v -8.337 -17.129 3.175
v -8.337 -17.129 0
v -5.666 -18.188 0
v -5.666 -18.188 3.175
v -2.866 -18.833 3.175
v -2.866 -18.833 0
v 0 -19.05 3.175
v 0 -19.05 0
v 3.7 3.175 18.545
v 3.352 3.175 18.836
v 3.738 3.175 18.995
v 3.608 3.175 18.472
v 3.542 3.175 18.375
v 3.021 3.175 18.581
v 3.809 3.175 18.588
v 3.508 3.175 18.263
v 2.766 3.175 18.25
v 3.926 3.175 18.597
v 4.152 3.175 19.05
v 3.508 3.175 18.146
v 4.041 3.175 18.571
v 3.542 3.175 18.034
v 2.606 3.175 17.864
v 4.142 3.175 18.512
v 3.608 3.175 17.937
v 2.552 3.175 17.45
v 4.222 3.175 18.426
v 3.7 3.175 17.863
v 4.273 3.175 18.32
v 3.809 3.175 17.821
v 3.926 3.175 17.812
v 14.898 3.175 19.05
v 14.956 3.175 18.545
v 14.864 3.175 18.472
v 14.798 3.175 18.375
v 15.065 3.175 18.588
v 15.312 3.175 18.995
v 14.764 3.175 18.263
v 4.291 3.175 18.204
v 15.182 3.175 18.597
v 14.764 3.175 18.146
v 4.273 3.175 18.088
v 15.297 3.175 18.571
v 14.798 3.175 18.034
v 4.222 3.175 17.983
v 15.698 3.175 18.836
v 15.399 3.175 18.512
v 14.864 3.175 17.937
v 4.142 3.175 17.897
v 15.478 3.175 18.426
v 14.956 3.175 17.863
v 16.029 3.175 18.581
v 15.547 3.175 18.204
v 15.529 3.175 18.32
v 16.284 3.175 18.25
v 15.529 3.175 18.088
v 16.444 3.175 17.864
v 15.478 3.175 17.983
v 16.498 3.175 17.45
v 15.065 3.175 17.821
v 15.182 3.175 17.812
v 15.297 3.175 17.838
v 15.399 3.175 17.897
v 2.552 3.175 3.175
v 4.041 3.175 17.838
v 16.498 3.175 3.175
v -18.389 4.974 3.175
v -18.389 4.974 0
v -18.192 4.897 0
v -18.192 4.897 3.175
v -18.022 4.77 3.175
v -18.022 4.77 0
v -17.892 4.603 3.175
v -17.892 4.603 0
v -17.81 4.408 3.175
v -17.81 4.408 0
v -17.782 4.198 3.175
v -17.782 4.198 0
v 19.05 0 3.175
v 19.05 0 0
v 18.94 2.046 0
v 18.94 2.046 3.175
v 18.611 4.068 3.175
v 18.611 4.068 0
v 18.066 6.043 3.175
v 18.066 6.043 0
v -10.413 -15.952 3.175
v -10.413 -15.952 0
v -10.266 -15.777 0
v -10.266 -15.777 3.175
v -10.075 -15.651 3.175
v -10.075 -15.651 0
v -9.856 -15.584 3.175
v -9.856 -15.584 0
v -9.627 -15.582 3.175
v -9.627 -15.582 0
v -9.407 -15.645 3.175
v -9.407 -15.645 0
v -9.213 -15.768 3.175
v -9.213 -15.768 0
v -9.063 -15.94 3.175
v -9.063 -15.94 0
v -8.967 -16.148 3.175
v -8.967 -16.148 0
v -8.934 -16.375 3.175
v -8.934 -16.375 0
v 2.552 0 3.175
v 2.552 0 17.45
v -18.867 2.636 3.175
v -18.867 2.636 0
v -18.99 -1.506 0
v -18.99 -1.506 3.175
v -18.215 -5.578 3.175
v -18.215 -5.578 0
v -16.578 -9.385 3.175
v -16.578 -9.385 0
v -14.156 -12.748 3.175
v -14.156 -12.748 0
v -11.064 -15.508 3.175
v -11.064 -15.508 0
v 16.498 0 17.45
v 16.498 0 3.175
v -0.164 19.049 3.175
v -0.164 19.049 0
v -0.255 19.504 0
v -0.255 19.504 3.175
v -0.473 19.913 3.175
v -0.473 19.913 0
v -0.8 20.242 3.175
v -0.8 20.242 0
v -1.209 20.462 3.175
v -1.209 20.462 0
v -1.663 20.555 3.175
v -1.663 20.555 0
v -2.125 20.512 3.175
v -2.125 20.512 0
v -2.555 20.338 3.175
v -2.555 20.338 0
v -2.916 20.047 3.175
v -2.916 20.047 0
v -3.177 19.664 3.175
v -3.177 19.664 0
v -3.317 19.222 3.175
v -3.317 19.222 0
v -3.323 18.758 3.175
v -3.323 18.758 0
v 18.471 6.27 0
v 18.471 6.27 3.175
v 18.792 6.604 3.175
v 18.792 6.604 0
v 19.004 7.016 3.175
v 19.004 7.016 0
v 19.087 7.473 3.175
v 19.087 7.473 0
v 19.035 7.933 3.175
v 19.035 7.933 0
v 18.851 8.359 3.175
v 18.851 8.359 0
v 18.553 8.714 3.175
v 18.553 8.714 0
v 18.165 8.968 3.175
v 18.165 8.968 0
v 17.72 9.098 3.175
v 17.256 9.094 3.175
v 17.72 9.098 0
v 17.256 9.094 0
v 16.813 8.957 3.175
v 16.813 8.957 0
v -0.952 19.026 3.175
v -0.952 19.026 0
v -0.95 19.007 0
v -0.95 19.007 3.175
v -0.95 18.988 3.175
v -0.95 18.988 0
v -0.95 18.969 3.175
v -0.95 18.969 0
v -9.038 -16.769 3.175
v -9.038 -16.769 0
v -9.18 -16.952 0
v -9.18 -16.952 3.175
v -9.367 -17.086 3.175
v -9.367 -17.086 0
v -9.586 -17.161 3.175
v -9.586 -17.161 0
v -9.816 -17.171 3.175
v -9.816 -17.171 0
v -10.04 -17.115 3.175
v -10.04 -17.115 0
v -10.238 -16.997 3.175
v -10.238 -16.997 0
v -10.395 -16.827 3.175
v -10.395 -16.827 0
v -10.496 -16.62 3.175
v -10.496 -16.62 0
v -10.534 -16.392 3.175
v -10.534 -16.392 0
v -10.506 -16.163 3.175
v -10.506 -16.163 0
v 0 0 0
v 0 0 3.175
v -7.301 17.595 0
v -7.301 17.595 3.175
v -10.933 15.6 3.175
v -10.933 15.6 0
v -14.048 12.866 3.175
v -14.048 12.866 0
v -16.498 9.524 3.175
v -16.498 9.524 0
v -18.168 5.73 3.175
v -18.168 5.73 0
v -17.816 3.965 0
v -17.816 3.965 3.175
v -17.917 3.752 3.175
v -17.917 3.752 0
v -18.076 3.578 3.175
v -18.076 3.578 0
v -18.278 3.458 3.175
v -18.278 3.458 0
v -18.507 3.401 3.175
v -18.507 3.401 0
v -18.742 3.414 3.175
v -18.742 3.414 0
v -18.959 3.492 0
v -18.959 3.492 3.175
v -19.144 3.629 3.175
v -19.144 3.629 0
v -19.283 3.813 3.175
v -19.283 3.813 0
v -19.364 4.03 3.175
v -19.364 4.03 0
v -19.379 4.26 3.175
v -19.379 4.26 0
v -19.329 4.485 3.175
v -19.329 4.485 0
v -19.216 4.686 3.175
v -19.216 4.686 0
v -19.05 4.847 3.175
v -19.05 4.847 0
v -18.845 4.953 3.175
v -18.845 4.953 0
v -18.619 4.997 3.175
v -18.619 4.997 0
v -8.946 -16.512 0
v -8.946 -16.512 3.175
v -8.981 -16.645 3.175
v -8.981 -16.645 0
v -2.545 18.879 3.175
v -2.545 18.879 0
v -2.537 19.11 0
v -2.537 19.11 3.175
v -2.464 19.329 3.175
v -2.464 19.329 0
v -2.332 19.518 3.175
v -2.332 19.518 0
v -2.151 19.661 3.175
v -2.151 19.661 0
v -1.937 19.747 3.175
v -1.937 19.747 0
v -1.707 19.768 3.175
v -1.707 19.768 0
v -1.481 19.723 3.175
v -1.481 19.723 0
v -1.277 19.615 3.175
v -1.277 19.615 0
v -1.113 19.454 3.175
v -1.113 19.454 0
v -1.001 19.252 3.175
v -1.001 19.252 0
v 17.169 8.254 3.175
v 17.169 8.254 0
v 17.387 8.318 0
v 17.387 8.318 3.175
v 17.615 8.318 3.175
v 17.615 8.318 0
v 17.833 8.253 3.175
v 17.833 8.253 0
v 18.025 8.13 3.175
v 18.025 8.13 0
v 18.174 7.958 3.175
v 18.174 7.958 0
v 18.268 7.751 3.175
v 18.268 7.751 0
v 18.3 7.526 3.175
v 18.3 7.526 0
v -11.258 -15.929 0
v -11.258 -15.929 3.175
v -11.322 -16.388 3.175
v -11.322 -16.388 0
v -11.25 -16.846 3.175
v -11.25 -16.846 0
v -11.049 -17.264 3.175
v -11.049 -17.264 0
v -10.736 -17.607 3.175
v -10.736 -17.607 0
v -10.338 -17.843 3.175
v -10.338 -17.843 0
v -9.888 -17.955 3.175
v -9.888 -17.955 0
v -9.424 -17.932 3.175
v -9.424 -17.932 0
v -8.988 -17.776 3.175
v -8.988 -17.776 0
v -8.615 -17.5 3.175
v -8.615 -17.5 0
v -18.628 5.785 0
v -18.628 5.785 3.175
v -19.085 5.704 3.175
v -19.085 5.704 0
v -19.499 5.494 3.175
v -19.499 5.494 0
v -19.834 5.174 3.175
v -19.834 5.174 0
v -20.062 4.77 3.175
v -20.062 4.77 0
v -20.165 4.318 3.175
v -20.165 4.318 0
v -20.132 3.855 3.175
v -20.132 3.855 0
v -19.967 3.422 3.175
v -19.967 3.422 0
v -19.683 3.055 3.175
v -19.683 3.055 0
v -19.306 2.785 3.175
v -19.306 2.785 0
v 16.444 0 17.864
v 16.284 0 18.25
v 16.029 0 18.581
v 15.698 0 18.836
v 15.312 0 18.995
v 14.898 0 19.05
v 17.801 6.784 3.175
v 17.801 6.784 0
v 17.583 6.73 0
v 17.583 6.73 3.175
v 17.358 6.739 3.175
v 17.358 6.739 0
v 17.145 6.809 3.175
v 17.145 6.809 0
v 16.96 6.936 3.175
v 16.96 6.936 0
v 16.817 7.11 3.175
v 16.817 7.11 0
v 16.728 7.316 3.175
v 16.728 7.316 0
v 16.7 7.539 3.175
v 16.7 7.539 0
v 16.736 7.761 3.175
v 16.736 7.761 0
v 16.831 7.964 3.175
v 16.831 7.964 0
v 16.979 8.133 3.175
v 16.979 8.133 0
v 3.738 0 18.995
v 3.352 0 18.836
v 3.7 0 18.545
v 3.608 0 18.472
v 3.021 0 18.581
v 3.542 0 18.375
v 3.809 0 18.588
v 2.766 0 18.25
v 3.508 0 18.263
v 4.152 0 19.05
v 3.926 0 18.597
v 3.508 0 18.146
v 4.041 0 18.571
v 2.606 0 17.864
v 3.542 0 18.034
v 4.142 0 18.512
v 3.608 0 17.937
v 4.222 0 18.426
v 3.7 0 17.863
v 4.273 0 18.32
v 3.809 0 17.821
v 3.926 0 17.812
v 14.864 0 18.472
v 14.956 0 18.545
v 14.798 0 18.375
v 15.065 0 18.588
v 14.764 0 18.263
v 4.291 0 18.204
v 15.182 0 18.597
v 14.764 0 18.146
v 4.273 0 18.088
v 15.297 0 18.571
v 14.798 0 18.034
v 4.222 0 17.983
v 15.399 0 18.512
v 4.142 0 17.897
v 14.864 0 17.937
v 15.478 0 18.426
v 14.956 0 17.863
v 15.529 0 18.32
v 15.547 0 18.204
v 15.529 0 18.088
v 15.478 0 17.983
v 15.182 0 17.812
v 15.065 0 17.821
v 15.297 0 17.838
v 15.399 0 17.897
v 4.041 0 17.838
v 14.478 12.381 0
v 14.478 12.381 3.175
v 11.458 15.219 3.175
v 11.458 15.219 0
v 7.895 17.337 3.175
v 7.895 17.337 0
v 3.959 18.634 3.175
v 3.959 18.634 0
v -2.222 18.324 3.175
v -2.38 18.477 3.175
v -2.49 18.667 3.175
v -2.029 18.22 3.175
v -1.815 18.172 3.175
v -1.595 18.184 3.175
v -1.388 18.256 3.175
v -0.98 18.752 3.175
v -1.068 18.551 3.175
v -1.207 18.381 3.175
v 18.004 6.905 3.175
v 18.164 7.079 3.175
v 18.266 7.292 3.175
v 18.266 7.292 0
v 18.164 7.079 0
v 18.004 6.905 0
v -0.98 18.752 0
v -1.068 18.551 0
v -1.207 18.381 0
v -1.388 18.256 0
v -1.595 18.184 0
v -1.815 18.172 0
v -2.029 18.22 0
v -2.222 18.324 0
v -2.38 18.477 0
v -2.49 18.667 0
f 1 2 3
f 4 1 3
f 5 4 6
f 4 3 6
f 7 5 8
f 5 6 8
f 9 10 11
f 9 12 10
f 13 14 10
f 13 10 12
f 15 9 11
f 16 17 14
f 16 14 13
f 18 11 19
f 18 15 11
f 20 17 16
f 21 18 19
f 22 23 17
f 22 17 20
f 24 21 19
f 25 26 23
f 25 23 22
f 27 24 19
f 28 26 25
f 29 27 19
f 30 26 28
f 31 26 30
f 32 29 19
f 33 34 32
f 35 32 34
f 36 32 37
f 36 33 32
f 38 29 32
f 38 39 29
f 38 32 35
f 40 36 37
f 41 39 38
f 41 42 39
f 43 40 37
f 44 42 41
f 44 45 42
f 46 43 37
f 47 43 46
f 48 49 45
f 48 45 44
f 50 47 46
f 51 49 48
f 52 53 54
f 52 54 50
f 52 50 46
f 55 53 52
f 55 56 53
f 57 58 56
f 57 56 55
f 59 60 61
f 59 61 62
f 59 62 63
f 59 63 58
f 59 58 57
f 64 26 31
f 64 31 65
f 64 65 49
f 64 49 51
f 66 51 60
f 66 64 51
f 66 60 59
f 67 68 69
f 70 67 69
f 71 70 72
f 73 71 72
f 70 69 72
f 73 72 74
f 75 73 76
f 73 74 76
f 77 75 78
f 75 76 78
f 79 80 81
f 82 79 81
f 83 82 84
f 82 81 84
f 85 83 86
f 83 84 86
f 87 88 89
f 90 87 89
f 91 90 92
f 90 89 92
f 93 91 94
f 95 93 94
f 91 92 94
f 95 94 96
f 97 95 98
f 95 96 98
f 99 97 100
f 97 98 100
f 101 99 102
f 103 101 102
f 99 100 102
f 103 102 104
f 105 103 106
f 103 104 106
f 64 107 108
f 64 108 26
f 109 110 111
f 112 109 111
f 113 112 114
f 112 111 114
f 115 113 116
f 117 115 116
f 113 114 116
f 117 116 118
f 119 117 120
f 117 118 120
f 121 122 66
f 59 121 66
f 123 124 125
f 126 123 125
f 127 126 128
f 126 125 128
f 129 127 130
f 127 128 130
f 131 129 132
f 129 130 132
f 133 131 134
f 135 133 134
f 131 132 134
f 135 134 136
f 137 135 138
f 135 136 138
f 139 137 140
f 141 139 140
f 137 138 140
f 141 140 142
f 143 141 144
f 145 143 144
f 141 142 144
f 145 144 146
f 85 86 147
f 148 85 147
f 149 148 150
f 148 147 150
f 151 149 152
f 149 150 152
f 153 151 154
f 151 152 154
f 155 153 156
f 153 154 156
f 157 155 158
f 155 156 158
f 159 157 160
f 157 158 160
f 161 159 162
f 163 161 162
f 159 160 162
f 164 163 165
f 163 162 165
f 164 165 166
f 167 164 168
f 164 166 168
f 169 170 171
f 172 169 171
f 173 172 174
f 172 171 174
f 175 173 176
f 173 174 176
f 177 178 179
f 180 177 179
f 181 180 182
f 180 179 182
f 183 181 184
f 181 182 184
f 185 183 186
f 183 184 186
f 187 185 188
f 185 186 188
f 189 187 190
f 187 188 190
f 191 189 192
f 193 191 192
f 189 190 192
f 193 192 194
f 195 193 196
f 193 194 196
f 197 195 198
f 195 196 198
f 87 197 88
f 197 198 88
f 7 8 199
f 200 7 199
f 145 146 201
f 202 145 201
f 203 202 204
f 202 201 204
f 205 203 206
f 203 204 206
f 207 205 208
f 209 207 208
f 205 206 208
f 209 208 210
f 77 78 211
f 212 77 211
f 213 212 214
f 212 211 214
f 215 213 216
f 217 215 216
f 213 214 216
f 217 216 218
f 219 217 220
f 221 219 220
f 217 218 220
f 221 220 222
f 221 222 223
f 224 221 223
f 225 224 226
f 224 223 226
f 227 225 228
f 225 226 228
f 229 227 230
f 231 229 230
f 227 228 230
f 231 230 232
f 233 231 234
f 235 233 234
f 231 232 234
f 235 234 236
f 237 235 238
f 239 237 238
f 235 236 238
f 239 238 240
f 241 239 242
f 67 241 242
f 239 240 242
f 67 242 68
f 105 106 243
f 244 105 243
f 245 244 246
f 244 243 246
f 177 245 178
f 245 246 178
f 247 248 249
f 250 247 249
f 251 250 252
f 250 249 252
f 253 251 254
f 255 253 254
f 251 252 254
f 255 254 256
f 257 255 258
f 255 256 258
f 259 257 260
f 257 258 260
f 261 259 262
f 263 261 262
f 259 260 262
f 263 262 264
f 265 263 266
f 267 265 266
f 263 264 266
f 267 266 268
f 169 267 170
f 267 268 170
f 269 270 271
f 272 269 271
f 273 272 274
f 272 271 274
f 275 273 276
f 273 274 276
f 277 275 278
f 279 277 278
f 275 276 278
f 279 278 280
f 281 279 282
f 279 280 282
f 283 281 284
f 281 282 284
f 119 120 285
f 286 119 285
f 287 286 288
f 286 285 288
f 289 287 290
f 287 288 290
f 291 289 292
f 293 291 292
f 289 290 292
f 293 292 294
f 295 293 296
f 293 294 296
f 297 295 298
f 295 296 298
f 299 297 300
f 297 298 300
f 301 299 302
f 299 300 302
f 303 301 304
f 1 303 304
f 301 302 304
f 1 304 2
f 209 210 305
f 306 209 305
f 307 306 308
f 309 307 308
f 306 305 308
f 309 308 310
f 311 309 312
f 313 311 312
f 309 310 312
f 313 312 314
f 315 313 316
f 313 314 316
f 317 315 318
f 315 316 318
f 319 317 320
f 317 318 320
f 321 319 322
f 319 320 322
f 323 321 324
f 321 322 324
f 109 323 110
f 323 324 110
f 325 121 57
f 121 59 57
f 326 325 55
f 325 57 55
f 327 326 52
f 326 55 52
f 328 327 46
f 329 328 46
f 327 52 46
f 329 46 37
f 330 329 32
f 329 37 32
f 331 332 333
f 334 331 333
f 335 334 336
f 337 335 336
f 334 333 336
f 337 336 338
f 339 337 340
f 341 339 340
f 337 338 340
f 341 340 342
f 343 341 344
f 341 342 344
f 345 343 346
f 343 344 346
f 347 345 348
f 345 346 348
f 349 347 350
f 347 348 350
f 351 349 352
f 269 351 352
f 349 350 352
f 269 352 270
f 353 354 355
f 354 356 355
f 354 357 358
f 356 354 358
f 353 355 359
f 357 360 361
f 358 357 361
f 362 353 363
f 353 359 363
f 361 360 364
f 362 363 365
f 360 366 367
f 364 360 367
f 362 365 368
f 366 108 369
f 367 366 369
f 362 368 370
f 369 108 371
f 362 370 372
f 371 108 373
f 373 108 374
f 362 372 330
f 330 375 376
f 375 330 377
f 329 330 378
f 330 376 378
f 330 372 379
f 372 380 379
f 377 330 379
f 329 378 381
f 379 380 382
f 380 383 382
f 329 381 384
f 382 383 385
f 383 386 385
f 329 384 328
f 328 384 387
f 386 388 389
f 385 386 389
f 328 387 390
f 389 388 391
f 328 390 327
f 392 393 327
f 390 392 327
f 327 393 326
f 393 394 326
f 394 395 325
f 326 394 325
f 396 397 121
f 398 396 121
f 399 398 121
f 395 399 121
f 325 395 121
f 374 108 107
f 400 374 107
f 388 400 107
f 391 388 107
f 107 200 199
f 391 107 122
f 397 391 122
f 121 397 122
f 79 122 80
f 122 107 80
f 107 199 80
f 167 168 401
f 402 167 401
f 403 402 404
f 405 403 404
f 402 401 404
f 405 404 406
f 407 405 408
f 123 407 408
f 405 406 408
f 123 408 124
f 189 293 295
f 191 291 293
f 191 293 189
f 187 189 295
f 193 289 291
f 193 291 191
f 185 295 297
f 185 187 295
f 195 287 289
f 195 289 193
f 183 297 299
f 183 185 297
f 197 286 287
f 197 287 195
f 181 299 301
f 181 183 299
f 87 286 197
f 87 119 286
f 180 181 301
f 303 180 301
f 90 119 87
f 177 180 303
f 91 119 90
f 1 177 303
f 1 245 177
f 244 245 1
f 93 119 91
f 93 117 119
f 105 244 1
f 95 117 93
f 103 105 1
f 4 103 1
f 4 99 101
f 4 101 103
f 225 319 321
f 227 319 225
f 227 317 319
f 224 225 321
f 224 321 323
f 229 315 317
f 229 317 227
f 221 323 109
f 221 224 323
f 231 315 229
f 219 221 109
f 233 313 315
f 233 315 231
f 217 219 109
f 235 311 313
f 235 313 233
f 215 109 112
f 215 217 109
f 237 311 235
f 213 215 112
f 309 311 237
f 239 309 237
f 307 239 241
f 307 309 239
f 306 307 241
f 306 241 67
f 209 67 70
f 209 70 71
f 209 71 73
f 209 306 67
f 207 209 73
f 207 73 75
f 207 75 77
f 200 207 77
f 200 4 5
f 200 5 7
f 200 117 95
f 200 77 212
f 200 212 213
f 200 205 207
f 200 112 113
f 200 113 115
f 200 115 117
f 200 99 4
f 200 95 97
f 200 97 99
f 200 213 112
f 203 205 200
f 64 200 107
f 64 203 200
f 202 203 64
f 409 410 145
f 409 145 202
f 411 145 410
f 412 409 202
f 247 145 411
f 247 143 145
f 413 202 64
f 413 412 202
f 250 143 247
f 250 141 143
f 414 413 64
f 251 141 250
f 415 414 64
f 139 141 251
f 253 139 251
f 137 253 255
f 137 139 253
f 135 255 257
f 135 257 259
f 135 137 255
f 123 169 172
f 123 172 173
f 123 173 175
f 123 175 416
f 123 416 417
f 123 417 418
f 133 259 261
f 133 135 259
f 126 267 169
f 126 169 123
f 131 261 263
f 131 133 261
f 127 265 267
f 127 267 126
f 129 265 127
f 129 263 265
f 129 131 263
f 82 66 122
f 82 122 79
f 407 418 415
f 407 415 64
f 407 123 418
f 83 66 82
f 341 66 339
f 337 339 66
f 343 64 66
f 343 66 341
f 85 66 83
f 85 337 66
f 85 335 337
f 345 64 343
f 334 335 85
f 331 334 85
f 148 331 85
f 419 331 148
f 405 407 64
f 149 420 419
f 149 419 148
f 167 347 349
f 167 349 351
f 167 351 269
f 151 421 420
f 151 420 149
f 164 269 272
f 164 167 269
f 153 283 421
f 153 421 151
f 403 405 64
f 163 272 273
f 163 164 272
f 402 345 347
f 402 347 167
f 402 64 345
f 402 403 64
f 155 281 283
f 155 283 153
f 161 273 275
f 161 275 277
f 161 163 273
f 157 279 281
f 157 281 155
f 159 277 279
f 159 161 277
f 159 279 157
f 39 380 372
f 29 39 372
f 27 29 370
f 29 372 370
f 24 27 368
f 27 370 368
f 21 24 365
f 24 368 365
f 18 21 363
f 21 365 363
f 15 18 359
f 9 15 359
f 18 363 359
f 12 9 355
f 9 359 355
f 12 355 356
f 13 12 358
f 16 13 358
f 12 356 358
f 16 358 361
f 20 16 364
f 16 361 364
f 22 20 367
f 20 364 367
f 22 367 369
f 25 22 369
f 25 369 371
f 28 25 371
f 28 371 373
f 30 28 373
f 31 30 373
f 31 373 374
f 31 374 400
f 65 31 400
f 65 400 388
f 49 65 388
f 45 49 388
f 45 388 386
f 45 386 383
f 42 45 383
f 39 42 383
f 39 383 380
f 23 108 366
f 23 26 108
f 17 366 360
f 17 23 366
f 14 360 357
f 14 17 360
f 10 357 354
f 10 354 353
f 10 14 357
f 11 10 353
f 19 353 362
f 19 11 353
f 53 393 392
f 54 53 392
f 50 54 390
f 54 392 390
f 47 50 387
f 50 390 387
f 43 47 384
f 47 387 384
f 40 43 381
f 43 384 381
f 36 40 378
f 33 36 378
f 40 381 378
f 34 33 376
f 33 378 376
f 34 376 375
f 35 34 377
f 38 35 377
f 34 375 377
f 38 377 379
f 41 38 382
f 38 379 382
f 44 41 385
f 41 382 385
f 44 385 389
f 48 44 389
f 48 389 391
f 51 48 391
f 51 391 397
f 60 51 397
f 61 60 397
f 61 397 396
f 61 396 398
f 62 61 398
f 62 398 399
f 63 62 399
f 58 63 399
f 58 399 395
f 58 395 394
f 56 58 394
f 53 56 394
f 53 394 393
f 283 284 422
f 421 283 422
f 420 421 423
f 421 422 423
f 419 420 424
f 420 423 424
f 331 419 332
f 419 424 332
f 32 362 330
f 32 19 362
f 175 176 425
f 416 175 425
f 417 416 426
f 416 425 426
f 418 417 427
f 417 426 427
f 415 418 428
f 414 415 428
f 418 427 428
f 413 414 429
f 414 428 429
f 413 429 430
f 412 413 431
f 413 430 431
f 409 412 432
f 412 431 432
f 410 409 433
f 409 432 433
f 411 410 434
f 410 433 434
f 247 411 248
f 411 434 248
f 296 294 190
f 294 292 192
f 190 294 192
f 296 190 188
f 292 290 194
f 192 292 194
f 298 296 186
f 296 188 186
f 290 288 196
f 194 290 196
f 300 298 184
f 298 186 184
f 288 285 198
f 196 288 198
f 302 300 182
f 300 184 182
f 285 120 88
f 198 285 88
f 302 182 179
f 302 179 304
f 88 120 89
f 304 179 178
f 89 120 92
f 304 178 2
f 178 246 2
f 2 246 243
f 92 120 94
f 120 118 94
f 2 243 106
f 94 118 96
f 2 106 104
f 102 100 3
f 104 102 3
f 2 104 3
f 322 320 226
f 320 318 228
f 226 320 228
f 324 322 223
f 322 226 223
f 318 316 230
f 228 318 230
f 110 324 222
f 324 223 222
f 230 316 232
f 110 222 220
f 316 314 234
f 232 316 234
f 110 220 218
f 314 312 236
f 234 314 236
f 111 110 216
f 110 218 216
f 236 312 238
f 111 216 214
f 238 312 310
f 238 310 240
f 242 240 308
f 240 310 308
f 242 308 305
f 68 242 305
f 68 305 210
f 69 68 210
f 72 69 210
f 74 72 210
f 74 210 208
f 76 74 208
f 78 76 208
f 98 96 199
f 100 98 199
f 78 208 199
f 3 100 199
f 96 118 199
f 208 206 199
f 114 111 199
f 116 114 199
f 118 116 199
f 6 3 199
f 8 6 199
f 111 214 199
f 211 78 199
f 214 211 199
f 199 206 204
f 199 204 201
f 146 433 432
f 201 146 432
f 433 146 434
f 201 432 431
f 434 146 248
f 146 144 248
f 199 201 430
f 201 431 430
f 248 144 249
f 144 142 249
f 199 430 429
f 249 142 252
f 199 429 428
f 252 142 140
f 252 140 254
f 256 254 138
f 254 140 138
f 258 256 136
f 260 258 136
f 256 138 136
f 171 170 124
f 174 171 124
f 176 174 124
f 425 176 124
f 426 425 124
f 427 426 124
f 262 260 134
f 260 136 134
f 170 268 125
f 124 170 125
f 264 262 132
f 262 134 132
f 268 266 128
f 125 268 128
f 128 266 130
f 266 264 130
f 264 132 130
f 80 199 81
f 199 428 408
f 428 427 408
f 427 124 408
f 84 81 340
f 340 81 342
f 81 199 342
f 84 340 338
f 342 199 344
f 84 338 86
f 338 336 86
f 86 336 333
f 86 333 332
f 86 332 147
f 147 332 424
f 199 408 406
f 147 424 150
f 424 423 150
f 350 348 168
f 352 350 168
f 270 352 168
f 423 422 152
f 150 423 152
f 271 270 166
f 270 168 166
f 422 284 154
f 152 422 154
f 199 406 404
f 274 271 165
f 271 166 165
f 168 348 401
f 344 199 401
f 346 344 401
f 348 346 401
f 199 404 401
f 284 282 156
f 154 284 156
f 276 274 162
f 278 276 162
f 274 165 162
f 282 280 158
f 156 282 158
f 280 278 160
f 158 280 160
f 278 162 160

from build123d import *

# Parameters (mm, degrees)
F1_DEPTH = 3.175
F0_W     = 13.9460621893
F0_H     = 3.175
F2_DEPTH = 19.05
F4_R     = 1.6002
F5_D     = 0.7874


with BuildPart() as f1:
    # F0 (on Top) → F1 (new body)
    with BuildSketch(Plane.XY):
        with BuildLine():
            ThreePointArc((-11.0640807489, -15.5076954182), (-10.5456846438, -17.739643222), (-8.337274974, -17.1286994839))
            ThreePointArc((-8.337274974, -17.1286994839), (-8.6896408656, -16.9526588365), (-9.0382916673, -16.7693704037))
            ThreePointArc((-9.0382916673, -16.7693704037), (-10.1433262143, -17.0628076037), (-10.4134929787, -15.9518545625))
            ThreePointArc((-10.4134929787, -15.9518545625), (-10.7410829362, -15.7331381917), (-11.0640807489, -15.5076954182))
        make_face()
        with BuildLine():
            ThreePointArc((-18.1676837587, 5.7304246652), (-20.1301990553, 4.5476908695), (-18.8667209135, 2.6361604601))
            ThreePointArc((-18.8667209135, 2.6361604601), (-18.8081833575, 3.0256798892), (-18.7416047219, 3.4139057466))
            ThreePointArc((-18.7416047219, 3.4139057466), (-19.3621545375, 4.3741789717), (-18.3890615299, 4.9744262032))
            ThreePointArc((-18.3890615299, 4.9744262032), (-18.2822807642, 5.3535698425), (-18.1676837587, 5.7304246652))
        make_face()
        with BuildLine():
            ThreePointArc((-0.9515720679, 19.0262190306), (-0.557987968, 19.0418263154), (-0.1641653109, 19.0492926312))
            ThreePointArc((-0.1641653109, 19.0492926312), (-1.8954625727, 20.5502707497), (-3.3229998068, 18.757936248))
            ThreePointArc((-3.3229998068, 18.757936248), (-2.934455716, 18.8226318471), (-2.5446570546, 18.8792801895))
            ThreePointArc((-2.5446570546, 18.8792801895), (-1.8231433853, 19.7661988811), (-0.9515720679, 19.0262190306))
        make_face()
        with BuildLine():
            ThreePointArc((17.8009576491, 6.7844238351), (17.9374252347, 6.4149260284), (18.0662240168, 6.0426856425))
            ThreePointArc((18.0662240168, 6.0426856425), (18.958738761, 8.1530749318), (16.8129940883, 8.9568817))
            ThreePointArc((16.8129940883, 8.9568817), (16.9945899865, 8.6073463501), (17.1689201725, 8.2541310937))
            ThreePointArc((17.1689201725, 8.2541310937), (17.9333659324, 8.1987289698), (18.3004742409, 7.5259153217))
            ThreePointArc((18.3004742409, 7.5259153217), (18.1639466917, 7.0788900287), (17.8009576491, 6.7844238351))
        make_face()
        with BuildLine():
            Line((0, -19.05), (0, 0))
            Line((0, 0), (2.5519689053, 0))
            Line((2.5519689053, 0), (2.5519689053, 3.175))
            Line((2.5519689053, 3.175), (16.4980310947, 3.175))
            Line((16.4980310947, 3.175), (16.4980310947, 0))
            Line((16.4980310947, 0), (19.05, 0))
            ThreePointArc((19.05, 0), (18.8024475471, 3.061121729), (18.0662240168, 6.0426856425))
            ThreePointArc((18.0662240168, 6.0426856425), (17.9374252347, 6.4149260284), (17.8009576491, 6.7844238351))
            ThreePointArc((17.8009576491, 6.7844238351), (16.7653585228, 7.2098268782), (17.1689201725, 8.2541310937))
            ThreePointArc((17.1689201725, 8.2541310937), (16.9945899865, 8.6073463501), (16.8129940883, 8.9568817))
            ThreePointArc((16.8129940883, 8.9568817), (9.7344781327, 16.3750552819), (-0.1641653109, 19.0492926312))
            ThreePointArc((-0.1641653109, 19.0492926312), (-0.557987968, 19.0418263154), (-0.9515720679, 19.0262190306))
            ThreePointArc((-0.9515720679, 19.0262190306), (-0.9500614951, 18.9978677335), (-0.9495577594, 18.969480692))
            ThreePointArc((-0.9495577594, 18.969480692), (-1.7044854564, 18.170656886), (-2.5446570546, 18.8792801895))
            ThreePointArc((-2.5446570546, 18.8792801895), (-2.934455716, 18.8226318471), (-3.3229998068, 18.757936248))
            ThreePointArc((-3.3229998068, 18.757936248), (-12.5654838561, 14.3182092268), (-18.1676837587, 5.7304246652))
            ThreePointArc((-18.1676837587, 5.7304246652), (-18.2822807642, 5.3535698425), (-18.3890615299, 4.9744262032))
            ThreePointArc((-18.3890615299, 4.9744262032), (-17.9515207228, 4.6908249859), (-17.7816222049, 4.1978684949))
            ThreePointArc((-17.7816222049, 4.1978684949), (-18.0756401917, 3.5781580739), (-18.7416047219, 3.4139057466))
            ThreePointArc((-18.7416047219, 3.4139057466), (-18.8081833575, 3.0256798892), (-18.8667209135, 2.6361604601))
            ThreePointArc((-18.8667209135, 2.6361604601), (-17.5003742409, -7.5259153217), (-11.0640807489, -15.5076954182))
            ThreePointArc((-11.0640807489, -15.5076954182), (-10.7410829362, -15.7331381917), (-10.4134929787, -15.9518545625))
            ThreePointArc((-10.4134929787, -15.9518545625), (-9.5143869792, -15.6058219661), (-8.9343781327, -16.3750552819))
            ThreePointArc((-8.9343781327, -16.3750552819), (-8.9607925373, -16.5789440003), (-9.0382916673, -16.7693704037))
            ThreePointArc((-9.0382916673, -16.7693704037), (-8.6896408656, -16.9526588365), (-8.337274974, -17.1286994839))
            ThreePointArc((-8.337274974, -17.1286994839), (-4.2778952087, -18.5634617619), (0, -19.05))
        make_face()
    extrude(amount=F1_DEPTH)

    # F0 (on Top) → F2 (join)
    with BuildSketch(Plane.XY):
        with Locations((9.525, 1.5875)):
            Rectangle(F0_W, F0_H)
    extrude(amount=F2_DEPTH)

    # F4
    f4_edges = [f1.edges().sort_by_distance(p)[0] for p in [
        (2.551969, 1.5875, 19.05),
        (16.498031, 1.5875, 19.05),
    ]]
    fillet(f4_edges, radius=F4_R)

    # F5 (through all)
    with Locations(Plane(origin=(0, 3.175, 0), x_dir=(-1, 0, 0), z_dir=(0, 1, 0))):
        with Locations((-3.8969237357, 18.2043871596), (-15.1530762643, 18.2043871596)):
            Hole(F5_D / 2)


solid = f1.part
